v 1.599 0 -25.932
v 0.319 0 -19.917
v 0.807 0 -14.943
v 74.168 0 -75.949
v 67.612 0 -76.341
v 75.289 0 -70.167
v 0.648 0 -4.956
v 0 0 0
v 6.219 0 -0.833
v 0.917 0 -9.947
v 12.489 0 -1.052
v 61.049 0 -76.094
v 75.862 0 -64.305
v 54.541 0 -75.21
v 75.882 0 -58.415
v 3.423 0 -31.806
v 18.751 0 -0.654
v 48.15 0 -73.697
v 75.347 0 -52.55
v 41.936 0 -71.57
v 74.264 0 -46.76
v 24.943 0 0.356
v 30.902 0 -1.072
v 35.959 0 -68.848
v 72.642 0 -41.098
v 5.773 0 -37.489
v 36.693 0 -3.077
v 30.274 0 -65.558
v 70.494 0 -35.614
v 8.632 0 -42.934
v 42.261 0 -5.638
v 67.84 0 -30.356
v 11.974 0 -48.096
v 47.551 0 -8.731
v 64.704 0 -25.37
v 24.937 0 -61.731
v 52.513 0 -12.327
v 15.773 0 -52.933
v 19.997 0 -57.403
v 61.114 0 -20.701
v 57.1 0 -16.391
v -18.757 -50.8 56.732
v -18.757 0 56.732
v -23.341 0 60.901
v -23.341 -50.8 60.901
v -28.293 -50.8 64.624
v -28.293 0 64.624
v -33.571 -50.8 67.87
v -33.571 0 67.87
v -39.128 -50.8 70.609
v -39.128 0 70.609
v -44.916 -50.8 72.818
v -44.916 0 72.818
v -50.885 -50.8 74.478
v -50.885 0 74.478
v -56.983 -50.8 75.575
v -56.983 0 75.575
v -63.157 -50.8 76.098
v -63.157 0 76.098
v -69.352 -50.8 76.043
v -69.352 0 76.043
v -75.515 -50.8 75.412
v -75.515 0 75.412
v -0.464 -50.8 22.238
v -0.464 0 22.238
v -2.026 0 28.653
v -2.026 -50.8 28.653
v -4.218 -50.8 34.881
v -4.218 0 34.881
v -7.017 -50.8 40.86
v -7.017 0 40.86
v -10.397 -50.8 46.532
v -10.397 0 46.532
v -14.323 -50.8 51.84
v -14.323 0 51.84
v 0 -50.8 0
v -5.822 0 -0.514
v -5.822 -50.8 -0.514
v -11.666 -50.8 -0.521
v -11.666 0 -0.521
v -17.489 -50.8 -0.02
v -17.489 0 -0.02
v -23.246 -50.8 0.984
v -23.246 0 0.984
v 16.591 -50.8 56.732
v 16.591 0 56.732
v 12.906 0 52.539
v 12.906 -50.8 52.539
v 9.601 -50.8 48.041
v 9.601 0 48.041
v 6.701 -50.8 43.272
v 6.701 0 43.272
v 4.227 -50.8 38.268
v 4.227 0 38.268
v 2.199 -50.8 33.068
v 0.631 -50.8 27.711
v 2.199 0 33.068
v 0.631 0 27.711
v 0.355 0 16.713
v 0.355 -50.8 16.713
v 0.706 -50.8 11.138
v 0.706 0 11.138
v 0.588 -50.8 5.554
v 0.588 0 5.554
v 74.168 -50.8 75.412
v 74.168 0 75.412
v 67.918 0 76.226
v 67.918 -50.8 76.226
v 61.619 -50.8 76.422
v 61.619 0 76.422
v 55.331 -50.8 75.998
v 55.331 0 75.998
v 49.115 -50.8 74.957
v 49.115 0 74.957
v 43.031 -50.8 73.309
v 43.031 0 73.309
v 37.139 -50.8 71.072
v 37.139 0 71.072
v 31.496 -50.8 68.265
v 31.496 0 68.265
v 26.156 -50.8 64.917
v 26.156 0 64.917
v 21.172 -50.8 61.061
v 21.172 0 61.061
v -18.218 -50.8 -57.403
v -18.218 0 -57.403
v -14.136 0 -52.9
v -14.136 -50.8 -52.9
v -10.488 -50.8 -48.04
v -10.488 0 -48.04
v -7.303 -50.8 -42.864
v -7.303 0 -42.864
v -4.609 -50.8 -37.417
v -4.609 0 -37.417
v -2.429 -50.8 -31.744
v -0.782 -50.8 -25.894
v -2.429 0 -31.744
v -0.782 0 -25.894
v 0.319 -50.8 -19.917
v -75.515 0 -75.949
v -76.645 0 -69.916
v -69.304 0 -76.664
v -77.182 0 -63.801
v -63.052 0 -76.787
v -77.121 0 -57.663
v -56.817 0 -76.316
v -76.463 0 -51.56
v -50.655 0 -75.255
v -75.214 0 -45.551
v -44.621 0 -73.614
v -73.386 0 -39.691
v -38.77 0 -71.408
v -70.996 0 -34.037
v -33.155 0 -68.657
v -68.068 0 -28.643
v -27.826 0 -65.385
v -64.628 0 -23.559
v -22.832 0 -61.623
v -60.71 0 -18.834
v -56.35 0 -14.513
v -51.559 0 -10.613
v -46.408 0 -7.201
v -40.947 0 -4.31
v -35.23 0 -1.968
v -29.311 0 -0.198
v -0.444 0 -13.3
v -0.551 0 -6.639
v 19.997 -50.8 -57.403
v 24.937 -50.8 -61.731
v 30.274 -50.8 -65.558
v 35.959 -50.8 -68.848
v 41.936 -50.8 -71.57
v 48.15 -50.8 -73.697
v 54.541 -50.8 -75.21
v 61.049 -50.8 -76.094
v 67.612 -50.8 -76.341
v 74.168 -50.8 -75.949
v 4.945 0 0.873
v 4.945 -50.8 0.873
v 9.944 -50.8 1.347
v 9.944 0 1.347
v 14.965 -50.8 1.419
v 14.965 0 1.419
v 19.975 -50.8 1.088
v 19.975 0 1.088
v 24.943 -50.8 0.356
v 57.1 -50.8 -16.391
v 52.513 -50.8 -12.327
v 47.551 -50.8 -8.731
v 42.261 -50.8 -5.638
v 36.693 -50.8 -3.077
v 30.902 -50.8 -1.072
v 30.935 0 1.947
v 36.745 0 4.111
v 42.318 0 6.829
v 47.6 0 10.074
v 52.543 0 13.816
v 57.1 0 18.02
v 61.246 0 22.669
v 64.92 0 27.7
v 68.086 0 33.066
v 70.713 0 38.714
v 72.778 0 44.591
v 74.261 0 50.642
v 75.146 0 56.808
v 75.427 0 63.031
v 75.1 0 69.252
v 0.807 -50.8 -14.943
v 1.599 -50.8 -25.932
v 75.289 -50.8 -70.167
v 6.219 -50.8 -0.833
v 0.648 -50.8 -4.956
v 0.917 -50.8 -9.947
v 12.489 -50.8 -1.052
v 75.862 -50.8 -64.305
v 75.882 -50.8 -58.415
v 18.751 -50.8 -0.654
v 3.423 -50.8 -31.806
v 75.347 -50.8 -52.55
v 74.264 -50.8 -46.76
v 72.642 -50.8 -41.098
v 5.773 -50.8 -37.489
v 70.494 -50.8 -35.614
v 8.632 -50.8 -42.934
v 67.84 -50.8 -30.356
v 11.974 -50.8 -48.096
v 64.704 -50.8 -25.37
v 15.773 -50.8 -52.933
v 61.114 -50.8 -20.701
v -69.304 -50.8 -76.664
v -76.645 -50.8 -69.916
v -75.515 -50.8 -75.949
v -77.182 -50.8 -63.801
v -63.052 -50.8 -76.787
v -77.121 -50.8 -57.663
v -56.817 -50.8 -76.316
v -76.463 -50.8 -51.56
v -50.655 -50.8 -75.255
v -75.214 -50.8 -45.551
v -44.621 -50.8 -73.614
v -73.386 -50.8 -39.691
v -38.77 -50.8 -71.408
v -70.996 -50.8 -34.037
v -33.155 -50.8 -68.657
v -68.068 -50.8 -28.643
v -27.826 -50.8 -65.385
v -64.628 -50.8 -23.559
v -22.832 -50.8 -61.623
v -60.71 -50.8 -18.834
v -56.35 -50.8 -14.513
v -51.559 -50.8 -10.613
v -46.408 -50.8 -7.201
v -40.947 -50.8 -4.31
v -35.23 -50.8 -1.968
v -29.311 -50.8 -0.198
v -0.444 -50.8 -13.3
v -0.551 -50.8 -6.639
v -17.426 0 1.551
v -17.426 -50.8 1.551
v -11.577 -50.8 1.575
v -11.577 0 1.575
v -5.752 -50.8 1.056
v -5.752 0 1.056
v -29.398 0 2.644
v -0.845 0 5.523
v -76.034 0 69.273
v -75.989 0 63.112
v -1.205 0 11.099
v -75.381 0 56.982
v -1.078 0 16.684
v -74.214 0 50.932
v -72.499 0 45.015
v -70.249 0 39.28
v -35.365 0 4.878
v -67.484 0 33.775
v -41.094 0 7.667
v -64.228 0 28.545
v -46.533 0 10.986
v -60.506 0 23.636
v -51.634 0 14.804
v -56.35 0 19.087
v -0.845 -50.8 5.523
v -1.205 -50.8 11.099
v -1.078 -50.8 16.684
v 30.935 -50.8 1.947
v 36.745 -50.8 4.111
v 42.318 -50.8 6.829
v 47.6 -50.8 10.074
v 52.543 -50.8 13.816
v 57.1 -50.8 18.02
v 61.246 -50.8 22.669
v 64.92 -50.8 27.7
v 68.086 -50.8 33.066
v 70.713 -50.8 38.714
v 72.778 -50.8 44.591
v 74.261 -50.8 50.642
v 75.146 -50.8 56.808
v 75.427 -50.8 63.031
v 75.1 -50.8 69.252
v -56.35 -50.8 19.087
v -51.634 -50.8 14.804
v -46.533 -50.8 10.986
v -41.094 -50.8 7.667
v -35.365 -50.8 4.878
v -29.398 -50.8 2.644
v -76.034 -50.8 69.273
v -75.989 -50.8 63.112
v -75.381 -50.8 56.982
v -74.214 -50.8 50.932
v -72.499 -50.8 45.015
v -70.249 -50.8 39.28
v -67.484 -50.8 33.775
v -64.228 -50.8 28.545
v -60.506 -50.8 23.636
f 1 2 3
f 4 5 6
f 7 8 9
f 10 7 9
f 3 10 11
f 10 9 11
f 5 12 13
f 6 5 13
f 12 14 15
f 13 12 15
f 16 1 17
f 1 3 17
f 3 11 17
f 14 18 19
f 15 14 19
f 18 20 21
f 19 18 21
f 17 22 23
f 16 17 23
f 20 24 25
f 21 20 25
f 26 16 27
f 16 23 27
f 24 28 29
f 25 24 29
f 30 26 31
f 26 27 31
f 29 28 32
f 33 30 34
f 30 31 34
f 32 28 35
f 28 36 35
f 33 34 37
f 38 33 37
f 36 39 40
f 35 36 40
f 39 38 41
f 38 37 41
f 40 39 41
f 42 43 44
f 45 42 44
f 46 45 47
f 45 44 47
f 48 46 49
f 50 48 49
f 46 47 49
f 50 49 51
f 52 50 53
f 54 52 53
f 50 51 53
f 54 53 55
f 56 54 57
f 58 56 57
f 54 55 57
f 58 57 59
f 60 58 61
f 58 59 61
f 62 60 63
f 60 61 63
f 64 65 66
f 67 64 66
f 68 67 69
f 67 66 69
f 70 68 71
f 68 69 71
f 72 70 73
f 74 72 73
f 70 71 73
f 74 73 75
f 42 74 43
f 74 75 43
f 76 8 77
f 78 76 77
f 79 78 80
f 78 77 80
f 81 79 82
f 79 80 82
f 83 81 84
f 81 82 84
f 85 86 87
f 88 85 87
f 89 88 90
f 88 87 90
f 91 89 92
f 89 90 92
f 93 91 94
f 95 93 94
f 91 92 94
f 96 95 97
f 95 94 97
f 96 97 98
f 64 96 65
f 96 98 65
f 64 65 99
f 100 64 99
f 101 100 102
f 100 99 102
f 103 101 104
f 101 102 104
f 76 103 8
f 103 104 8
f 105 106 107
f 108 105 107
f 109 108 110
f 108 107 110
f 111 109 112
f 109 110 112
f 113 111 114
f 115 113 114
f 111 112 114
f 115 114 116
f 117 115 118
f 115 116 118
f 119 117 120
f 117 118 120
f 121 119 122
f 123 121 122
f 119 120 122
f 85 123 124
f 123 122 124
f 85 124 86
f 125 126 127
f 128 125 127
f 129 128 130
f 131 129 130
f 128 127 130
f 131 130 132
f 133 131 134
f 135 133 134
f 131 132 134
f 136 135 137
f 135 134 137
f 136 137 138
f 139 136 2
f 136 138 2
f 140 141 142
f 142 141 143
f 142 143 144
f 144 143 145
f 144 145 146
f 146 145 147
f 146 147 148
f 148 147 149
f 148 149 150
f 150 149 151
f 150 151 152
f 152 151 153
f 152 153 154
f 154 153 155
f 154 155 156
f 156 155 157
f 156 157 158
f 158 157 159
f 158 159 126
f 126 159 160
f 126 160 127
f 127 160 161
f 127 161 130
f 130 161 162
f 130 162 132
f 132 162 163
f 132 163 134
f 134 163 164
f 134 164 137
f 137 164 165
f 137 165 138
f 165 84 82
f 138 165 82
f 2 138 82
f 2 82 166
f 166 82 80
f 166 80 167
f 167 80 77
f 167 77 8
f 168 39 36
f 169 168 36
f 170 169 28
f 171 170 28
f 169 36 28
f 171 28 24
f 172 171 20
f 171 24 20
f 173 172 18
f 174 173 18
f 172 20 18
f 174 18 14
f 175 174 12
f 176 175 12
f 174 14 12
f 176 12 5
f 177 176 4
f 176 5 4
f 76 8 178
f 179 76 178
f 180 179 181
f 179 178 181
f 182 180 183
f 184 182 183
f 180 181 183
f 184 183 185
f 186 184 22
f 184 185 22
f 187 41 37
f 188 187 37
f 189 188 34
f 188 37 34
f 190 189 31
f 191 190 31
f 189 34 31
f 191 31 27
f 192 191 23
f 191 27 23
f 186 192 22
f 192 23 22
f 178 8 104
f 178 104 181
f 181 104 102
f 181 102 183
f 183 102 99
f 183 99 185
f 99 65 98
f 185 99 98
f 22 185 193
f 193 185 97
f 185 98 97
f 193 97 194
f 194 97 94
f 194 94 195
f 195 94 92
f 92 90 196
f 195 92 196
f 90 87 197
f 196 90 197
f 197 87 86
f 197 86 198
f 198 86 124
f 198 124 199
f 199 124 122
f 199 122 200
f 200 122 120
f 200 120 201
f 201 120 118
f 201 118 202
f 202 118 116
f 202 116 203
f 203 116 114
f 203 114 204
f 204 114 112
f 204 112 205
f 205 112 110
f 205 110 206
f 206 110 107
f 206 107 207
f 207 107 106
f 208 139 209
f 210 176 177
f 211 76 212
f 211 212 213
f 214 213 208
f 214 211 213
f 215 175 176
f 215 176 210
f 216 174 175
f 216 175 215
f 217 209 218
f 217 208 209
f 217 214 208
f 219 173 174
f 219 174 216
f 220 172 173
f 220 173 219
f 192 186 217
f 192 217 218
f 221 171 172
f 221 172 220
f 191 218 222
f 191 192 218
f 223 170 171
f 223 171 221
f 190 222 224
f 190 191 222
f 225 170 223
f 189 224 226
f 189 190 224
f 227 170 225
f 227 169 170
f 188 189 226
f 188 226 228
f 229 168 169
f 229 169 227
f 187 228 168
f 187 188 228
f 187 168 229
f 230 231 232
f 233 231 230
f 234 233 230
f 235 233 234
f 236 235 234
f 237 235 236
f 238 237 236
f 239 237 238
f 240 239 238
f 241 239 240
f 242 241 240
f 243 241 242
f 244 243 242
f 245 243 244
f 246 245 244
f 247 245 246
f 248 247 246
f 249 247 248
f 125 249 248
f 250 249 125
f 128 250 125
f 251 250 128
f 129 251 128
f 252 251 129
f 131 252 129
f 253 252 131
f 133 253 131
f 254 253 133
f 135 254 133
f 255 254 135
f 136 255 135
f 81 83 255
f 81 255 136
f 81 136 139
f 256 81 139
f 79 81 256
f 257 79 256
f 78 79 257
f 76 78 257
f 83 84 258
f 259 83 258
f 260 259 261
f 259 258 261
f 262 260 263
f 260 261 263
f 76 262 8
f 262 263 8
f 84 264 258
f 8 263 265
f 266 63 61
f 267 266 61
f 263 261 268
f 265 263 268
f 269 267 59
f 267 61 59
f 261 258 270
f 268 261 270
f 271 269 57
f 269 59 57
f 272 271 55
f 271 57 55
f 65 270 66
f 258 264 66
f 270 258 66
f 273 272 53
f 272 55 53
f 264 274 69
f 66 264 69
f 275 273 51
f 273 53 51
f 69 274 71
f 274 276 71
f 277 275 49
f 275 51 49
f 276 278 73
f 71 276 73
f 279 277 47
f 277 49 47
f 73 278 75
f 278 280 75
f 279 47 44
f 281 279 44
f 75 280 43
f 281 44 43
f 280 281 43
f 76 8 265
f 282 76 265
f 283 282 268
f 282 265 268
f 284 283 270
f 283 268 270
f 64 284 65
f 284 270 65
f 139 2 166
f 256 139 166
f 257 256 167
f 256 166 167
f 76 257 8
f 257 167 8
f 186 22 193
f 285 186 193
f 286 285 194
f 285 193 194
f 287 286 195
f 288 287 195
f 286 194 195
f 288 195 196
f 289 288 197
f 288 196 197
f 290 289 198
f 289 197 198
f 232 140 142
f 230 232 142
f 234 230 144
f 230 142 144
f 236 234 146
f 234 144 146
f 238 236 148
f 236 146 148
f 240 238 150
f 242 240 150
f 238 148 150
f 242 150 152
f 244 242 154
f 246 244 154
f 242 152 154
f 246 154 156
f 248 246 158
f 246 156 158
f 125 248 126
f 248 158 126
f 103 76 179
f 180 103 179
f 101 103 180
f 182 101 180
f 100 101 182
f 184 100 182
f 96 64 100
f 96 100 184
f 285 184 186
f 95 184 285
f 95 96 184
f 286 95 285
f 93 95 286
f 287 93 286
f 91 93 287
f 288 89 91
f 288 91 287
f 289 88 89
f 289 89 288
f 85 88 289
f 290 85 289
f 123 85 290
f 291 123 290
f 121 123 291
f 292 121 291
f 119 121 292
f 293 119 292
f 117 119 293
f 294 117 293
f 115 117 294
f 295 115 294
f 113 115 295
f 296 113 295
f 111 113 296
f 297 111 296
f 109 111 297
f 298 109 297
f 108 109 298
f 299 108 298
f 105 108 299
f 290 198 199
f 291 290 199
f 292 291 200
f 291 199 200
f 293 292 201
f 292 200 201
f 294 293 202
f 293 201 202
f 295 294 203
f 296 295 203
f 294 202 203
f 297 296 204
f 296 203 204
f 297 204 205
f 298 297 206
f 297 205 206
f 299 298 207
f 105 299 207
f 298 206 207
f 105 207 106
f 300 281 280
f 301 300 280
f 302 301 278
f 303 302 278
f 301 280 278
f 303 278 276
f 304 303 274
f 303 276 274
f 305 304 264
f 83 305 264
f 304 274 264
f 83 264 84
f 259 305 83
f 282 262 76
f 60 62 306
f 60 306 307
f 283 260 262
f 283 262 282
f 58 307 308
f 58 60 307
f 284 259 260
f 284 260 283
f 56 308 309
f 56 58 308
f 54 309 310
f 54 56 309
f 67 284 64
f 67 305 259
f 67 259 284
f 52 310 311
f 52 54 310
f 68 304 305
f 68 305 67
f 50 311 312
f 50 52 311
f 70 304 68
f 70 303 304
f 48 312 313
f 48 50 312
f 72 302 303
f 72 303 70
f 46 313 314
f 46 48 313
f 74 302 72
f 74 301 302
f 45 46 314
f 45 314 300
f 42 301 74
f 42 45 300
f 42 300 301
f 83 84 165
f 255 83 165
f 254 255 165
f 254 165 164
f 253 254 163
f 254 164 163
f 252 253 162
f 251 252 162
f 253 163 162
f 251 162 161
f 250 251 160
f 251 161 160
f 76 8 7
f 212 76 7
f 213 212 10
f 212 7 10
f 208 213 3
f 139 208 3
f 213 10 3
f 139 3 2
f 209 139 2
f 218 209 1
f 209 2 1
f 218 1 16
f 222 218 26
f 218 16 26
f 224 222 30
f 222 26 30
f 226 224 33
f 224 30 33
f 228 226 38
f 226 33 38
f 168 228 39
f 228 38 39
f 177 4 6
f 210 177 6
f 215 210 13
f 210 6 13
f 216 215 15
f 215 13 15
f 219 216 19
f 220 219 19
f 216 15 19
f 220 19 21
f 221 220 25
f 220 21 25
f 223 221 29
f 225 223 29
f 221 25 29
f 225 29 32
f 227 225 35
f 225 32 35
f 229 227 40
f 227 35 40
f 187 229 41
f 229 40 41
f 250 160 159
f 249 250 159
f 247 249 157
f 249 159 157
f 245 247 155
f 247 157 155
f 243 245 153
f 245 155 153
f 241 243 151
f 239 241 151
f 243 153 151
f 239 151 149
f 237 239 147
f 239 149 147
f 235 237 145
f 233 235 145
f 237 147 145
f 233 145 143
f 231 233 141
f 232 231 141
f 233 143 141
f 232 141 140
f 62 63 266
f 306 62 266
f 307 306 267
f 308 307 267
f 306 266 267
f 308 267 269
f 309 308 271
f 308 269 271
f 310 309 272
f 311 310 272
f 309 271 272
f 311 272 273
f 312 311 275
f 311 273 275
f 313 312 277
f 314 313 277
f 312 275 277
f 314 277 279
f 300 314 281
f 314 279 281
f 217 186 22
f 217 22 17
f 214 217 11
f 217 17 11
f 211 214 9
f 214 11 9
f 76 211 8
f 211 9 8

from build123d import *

# Parameters (mm, degrees)
F1_DEPTH = 50.8


with BuildPart() as f1:
    # F0 (on Front) → F1 (new body)
    with BuildSketch(Plane.XZ):
        with BuildLine():
            ThreePointArc((16.590552, 56.732368), (5.409572, 40.797122), (-0.463648, 22.237712))
            ThreePointArc((-0.463648, 22.237712), (0.70607, 11.138411), (0, 0))
            ThreePointArc((0, 0), (12.453687, 1.43335), (24.943237, 0.356344))
            ThreePointArc((24.943237, 0.356344), (42.317613, 6.828737), (57.09996, 18.01994))
            ThreePointArc((57.09996, 18.01994), (72.778398, 44.59106), (74.168026, 75.411618))
            ThreePointArc((74.168026, 75.411618), (43.031356, 73.309333), (16.590552, 56.732368))
        make_face()
        with BuildLine():
            ThreePointArc((-18.757315, 56.732368), (-44.916178, 72.818204), (-75.515434, 75.411618))
            ThreePointArc((-75.515434, 75.411618), (-72.498859, 45.015417), (-56.350435, 19.087495))
            ThreePointArc((-56.350435, 19.087495), (-41.093713, 7.667165), (-23.246298, 0.984257))
            ThreePointArc((-23.246298, 0.984257), (-11.577307, 1.574822), (0, 0))
            ThreePointArc((0, 0), (-1.205288, 11.09856), (-0.463648, 22.237712))
            ThreePointArc((-0.463648, 22.237712), (-7.017321, 40.86028), (-18.757315, 56.732368))
        make_face()
        with BuildLine():
            ThreePointArc((0, 0), (-11.66603, -0.520642), (-23.246298, 0.984257))
            ThreePointArc((-23.246298, 0.984257), (-40.947233, -4.310308), (-56.350435, -14.513096))
            ThreePointArc((-56.350435, -14.513096), (-74.371373, -42.598651), (-75.515434, -75.948969))
            ThreePointArc((-75.515434, -75.948969), (-44.620722, -73.614442), (-18.21762, -57.403042))
            ThreePointArc((-18.21762, -57.403042), (-5.892986, -40.17164), (0.318641, -19.917418))
            ThreePointArc((0.318641, -19.917418), (-0.579963, -9.970536), (0, 0))
        make_face()
        with BuildLine():
            ThreePointArc((24.943237, 0.356344), (12.489191, -1.051813), (0, 0))
            ThreePointArc((0, 0), (0.917245, -9.946584), (0.318641, -19.917418))
            ThreePointArc((0.318641, -19.917418), (7.140548, -40.24408), (19.996739, -57.403042))
            ThreePointArc((19.996739, -57.403042), (45.016922, -72.709065), (74.168026, -75.948969))
            ThreePointArc((74.168026, -75.948969), (73.519515, -43.910142), (57.09996, -16.390964))
            ThreePointArc((57.09996, -16.390964), (42.260726, -5.638046), (24.943237, 0.356344))
        make_face()
    extrude(amount=F1_DEPTH)


solid = f1.part
